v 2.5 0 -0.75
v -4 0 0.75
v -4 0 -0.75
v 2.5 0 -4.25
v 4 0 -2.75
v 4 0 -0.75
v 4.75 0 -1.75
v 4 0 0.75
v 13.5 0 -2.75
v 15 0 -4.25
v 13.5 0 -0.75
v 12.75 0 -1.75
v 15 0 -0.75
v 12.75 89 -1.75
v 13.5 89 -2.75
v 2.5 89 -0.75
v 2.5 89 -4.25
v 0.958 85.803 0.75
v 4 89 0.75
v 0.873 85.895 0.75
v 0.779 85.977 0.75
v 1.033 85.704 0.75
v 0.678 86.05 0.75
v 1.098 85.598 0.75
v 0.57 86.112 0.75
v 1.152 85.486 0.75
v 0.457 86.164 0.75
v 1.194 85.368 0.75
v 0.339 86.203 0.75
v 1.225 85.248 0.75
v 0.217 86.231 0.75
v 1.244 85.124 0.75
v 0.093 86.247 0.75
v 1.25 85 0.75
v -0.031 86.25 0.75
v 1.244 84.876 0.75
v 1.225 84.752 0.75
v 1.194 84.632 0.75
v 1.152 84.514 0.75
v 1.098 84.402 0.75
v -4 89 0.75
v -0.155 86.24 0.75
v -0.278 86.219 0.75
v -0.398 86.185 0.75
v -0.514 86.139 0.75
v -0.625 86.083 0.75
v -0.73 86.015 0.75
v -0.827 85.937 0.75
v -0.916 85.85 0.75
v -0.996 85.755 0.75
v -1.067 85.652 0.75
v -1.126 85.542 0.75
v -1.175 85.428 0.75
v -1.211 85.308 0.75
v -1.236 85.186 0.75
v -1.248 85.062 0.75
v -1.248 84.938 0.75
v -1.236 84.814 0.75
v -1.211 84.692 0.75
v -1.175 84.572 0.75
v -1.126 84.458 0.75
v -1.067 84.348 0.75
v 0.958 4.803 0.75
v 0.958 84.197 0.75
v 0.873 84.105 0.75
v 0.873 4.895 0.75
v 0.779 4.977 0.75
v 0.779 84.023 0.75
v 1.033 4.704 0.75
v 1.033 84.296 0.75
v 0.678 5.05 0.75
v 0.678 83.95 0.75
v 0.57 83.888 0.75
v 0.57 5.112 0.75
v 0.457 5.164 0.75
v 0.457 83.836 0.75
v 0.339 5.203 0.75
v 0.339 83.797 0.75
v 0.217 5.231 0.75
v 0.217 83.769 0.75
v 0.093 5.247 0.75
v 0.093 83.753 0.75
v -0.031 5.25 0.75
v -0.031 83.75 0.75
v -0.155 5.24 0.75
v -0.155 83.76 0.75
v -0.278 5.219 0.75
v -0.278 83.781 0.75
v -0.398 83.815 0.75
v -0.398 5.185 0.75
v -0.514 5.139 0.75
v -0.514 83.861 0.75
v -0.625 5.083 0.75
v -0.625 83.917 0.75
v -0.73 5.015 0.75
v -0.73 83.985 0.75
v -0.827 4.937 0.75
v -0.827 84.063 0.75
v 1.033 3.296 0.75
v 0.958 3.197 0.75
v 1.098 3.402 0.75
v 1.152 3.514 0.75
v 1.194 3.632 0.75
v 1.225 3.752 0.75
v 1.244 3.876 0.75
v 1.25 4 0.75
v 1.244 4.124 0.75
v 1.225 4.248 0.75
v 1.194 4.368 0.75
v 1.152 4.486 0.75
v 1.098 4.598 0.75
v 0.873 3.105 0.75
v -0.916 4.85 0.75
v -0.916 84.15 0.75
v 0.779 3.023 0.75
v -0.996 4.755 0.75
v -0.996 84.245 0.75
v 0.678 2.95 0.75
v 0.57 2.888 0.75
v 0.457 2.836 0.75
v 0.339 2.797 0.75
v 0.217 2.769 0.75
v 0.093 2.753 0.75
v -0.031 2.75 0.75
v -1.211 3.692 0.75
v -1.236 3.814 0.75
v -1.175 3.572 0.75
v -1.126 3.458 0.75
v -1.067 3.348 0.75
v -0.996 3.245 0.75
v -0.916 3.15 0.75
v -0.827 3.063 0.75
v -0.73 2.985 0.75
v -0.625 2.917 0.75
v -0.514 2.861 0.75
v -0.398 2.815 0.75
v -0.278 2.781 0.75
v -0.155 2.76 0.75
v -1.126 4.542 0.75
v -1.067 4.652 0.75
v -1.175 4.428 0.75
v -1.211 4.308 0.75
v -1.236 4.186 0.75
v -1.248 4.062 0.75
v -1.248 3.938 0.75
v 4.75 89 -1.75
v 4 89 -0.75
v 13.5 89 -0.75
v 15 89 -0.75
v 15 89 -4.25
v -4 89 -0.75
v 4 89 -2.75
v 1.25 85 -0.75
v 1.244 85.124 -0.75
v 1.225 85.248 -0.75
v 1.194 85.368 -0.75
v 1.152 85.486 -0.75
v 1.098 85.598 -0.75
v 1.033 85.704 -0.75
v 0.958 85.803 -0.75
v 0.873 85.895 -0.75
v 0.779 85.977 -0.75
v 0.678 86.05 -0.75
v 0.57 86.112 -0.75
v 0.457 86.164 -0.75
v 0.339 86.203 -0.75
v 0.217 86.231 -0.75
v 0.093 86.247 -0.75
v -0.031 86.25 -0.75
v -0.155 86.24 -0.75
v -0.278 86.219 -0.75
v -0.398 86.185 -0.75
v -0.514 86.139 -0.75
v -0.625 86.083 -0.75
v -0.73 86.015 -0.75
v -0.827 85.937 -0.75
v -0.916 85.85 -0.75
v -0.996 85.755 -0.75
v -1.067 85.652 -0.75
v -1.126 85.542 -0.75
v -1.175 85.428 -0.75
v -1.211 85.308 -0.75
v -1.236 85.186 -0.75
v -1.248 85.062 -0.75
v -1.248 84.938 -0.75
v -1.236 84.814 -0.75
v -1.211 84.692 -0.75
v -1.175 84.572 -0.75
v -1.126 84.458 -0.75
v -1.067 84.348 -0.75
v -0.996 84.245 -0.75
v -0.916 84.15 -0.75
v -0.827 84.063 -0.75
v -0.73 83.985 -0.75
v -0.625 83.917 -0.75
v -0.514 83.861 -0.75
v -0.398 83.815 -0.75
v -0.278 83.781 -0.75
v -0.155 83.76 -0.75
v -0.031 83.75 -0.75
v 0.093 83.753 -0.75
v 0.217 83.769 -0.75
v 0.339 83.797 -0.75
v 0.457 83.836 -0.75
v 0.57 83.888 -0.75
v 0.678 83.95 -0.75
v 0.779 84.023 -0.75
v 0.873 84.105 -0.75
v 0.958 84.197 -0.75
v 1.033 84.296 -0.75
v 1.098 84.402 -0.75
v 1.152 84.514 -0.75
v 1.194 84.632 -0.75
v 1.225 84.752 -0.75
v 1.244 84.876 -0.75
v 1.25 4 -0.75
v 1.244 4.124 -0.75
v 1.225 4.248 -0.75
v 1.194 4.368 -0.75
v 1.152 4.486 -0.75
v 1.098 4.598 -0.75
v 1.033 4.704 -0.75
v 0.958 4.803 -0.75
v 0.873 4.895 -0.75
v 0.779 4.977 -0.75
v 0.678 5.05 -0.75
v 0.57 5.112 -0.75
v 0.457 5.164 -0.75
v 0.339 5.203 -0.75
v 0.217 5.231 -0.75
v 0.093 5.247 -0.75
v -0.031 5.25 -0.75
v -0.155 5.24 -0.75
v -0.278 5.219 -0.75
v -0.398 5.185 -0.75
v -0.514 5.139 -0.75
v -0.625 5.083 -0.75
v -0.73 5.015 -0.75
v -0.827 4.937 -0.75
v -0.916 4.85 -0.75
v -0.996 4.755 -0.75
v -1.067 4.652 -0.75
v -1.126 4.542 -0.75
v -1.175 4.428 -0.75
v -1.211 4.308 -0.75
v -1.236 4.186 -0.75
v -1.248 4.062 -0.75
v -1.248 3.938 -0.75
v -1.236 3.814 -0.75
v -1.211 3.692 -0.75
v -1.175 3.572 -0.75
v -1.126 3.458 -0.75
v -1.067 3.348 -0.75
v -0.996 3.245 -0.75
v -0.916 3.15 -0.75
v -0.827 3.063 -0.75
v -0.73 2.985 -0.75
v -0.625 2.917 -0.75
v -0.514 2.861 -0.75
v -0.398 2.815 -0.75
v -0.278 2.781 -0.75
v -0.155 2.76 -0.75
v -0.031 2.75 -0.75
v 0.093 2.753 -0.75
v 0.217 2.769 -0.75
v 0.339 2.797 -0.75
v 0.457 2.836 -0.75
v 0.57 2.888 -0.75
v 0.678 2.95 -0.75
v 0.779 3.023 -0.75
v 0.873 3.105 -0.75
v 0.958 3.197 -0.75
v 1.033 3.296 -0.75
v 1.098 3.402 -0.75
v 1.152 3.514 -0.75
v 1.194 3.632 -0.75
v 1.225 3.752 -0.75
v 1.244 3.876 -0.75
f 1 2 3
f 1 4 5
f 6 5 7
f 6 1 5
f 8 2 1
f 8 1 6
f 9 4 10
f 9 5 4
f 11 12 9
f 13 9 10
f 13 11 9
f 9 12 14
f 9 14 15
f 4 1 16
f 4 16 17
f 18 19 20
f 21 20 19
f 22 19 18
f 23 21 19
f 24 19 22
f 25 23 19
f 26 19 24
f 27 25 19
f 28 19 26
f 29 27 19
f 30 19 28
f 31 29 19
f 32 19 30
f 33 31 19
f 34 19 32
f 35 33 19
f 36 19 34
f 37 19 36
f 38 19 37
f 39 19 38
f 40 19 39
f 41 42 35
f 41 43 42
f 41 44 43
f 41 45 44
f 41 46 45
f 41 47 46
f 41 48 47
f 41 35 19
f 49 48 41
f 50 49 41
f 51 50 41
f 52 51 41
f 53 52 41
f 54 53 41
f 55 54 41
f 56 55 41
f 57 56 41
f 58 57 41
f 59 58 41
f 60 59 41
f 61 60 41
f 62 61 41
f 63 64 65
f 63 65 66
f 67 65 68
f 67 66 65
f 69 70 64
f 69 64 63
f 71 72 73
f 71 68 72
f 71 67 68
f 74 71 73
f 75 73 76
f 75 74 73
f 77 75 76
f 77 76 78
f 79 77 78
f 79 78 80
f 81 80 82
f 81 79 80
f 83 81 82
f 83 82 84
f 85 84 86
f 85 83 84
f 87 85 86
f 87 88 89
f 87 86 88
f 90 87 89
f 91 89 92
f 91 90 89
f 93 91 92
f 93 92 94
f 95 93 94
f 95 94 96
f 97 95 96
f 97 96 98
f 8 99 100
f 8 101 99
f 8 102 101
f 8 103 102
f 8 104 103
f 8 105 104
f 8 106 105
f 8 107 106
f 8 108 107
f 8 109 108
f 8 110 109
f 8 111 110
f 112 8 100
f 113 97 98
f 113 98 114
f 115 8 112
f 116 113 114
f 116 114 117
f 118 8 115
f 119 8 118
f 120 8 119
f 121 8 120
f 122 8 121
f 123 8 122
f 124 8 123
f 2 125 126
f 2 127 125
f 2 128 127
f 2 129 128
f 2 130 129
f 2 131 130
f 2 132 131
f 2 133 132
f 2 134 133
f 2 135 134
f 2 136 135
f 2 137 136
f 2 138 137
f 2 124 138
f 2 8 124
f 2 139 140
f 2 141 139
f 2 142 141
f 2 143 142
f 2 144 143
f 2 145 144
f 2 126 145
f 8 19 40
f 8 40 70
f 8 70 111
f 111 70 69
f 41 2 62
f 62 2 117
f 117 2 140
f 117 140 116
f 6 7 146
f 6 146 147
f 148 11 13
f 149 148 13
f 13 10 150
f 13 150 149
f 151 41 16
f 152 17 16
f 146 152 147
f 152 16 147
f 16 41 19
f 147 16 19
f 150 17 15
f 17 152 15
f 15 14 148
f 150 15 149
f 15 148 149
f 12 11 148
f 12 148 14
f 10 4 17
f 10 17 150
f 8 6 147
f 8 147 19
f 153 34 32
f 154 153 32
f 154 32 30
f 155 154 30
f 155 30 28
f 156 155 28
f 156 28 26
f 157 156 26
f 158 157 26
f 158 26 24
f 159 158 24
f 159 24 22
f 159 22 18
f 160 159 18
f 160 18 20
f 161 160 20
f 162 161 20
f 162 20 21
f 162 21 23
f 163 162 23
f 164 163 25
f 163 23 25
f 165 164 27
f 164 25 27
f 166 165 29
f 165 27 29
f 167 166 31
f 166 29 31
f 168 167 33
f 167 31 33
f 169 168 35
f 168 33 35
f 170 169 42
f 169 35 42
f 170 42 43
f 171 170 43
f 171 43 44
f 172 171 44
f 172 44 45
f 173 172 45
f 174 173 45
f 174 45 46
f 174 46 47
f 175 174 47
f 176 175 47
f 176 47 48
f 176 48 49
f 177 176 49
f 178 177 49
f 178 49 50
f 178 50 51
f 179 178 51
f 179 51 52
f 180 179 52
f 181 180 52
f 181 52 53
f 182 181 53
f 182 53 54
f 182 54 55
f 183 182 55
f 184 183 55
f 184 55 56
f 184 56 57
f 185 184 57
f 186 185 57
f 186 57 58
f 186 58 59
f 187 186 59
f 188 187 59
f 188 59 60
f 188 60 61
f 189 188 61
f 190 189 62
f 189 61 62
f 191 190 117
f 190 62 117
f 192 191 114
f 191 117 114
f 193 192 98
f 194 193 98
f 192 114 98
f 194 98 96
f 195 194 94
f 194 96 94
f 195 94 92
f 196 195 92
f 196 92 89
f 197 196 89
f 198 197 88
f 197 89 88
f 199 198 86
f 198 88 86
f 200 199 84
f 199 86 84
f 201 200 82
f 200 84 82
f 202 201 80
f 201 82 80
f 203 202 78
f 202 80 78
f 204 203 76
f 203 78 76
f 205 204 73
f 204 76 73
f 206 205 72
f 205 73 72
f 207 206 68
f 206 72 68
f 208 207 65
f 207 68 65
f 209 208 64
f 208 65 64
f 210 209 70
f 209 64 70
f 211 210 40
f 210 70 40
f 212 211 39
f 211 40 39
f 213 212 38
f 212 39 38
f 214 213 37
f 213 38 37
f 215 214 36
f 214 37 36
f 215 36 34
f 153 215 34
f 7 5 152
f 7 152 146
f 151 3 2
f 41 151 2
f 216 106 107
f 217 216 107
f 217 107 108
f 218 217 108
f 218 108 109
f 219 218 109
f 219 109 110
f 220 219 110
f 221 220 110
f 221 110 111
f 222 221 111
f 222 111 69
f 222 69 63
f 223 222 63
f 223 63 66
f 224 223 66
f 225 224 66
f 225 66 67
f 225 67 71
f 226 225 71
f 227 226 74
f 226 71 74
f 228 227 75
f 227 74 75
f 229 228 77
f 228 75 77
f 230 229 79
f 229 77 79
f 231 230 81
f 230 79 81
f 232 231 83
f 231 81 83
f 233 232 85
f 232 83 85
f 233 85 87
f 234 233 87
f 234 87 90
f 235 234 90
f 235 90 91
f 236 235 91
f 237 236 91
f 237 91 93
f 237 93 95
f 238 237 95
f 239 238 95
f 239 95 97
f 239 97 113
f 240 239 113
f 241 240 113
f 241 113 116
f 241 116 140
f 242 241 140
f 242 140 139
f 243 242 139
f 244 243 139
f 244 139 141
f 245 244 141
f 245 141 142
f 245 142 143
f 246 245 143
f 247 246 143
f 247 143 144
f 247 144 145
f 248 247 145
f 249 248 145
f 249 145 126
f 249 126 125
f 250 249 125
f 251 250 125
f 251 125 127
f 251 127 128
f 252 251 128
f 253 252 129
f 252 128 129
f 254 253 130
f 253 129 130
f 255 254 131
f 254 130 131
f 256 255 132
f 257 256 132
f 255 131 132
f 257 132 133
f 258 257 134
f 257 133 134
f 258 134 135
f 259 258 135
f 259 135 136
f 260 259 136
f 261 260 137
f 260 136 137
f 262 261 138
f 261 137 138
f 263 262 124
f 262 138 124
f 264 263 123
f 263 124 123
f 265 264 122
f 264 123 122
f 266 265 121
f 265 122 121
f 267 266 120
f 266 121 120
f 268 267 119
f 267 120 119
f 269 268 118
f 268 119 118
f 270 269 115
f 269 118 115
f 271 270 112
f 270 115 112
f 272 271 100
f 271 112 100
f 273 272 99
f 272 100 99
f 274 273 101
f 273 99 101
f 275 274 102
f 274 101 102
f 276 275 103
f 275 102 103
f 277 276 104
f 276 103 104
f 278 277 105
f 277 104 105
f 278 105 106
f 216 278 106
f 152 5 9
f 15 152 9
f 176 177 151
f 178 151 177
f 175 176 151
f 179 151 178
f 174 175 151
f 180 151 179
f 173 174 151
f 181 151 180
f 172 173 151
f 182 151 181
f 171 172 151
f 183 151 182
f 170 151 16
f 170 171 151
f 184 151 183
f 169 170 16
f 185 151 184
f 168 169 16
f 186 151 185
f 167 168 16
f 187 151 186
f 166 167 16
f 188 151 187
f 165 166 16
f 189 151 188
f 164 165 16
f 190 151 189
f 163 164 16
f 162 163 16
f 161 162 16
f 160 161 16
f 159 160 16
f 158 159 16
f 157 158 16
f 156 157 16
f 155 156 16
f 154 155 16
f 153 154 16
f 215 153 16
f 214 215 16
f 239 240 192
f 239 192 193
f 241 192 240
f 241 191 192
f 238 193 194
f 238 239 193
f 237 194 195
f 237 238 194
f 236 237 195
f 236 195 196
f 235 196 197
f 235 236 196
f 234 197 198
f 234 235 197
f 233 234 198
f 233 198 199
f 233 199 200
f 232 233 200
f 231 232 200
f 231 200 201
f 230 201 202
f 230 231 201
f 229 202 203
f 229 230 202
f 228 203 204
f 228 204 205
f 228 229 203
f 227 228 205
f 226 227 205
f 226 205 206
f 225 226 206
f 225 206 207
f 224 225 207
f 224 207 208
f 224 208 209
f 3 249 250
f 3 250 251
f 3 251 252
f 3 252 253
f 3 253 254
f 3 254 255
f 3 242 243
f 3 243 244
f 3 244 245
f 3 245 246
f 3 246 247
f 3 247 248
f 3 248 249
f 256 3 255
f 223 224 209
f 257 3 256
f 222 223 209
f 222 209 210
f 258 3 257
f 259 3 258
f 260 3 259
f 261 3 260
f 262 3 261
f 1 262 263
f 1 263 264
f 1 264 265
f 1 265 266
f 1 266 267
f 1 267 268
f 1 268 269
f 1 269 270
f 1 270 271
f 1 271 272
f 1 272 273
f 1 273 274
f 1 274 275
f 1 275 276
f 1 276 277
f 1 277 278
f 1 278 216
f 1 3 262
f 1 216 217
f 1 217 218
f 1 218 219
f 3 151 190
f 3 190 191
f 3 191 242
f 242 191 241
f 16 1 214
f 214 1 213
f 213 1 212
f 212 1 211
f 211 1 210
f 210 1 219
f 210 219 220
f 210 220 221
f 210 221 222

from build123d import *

# Parameters (mm, degrees)
F0_W     = 1.5
F0_H     = 2
F0_H_2   = 1.5
F0_W_2   = 6.5
F0_W_3   = 9.5
F1_DEPTH = 89
F2_R     = 1.25
F3_DEPTH = 25


with BuildPart() as f1:
    # F0 (on Front) → F1 (new body)
    with BuildSketch(Plane.XZ):
        with Locations((3.25, -1.75)):
            Rectangle(F0_W, F0_H)
        with Locations((3.25, 0)):
            Rectangle(F0_W, F0_H_2)
        Polygon((4.75, -1.75), (4, -0.75), (4, -2.75), align=None)
        with Locations((-0.75, 0)):
            Rectangle(F0_W_2, F0_H_2)
        with Locations((8.75, -3.5)):
            Rectangle(F0_W_3, F0_H_2)
        with Locations((3.25, -3.5)):
            Rectangle(F0_W, F0_H_2)
        with Locations((14.25, -1.75)):
            Rectangle(F0_W, F0_H)
        with Locations((14.25, -3.5)):
            Rectangle(F0_W, F0_H_2)
        Polygon((12.75, -1.75), (13.5, -2.75), (13.5, -0.75), align=None)
    extrude(amount=-F1_DEPTH)

    # F2 (on face) → F3 (cut)
    with BuildSketch(Plane.XY.offset(0.75)):
        with Locations((0, 4)):
            Circle(F2_R)
        with Locations((0, 85)):
            Circle(F2_R)
    extrude(amount=-F3_DEPTH, mode=Mode.SUBTRACT)


solid = f1.part
